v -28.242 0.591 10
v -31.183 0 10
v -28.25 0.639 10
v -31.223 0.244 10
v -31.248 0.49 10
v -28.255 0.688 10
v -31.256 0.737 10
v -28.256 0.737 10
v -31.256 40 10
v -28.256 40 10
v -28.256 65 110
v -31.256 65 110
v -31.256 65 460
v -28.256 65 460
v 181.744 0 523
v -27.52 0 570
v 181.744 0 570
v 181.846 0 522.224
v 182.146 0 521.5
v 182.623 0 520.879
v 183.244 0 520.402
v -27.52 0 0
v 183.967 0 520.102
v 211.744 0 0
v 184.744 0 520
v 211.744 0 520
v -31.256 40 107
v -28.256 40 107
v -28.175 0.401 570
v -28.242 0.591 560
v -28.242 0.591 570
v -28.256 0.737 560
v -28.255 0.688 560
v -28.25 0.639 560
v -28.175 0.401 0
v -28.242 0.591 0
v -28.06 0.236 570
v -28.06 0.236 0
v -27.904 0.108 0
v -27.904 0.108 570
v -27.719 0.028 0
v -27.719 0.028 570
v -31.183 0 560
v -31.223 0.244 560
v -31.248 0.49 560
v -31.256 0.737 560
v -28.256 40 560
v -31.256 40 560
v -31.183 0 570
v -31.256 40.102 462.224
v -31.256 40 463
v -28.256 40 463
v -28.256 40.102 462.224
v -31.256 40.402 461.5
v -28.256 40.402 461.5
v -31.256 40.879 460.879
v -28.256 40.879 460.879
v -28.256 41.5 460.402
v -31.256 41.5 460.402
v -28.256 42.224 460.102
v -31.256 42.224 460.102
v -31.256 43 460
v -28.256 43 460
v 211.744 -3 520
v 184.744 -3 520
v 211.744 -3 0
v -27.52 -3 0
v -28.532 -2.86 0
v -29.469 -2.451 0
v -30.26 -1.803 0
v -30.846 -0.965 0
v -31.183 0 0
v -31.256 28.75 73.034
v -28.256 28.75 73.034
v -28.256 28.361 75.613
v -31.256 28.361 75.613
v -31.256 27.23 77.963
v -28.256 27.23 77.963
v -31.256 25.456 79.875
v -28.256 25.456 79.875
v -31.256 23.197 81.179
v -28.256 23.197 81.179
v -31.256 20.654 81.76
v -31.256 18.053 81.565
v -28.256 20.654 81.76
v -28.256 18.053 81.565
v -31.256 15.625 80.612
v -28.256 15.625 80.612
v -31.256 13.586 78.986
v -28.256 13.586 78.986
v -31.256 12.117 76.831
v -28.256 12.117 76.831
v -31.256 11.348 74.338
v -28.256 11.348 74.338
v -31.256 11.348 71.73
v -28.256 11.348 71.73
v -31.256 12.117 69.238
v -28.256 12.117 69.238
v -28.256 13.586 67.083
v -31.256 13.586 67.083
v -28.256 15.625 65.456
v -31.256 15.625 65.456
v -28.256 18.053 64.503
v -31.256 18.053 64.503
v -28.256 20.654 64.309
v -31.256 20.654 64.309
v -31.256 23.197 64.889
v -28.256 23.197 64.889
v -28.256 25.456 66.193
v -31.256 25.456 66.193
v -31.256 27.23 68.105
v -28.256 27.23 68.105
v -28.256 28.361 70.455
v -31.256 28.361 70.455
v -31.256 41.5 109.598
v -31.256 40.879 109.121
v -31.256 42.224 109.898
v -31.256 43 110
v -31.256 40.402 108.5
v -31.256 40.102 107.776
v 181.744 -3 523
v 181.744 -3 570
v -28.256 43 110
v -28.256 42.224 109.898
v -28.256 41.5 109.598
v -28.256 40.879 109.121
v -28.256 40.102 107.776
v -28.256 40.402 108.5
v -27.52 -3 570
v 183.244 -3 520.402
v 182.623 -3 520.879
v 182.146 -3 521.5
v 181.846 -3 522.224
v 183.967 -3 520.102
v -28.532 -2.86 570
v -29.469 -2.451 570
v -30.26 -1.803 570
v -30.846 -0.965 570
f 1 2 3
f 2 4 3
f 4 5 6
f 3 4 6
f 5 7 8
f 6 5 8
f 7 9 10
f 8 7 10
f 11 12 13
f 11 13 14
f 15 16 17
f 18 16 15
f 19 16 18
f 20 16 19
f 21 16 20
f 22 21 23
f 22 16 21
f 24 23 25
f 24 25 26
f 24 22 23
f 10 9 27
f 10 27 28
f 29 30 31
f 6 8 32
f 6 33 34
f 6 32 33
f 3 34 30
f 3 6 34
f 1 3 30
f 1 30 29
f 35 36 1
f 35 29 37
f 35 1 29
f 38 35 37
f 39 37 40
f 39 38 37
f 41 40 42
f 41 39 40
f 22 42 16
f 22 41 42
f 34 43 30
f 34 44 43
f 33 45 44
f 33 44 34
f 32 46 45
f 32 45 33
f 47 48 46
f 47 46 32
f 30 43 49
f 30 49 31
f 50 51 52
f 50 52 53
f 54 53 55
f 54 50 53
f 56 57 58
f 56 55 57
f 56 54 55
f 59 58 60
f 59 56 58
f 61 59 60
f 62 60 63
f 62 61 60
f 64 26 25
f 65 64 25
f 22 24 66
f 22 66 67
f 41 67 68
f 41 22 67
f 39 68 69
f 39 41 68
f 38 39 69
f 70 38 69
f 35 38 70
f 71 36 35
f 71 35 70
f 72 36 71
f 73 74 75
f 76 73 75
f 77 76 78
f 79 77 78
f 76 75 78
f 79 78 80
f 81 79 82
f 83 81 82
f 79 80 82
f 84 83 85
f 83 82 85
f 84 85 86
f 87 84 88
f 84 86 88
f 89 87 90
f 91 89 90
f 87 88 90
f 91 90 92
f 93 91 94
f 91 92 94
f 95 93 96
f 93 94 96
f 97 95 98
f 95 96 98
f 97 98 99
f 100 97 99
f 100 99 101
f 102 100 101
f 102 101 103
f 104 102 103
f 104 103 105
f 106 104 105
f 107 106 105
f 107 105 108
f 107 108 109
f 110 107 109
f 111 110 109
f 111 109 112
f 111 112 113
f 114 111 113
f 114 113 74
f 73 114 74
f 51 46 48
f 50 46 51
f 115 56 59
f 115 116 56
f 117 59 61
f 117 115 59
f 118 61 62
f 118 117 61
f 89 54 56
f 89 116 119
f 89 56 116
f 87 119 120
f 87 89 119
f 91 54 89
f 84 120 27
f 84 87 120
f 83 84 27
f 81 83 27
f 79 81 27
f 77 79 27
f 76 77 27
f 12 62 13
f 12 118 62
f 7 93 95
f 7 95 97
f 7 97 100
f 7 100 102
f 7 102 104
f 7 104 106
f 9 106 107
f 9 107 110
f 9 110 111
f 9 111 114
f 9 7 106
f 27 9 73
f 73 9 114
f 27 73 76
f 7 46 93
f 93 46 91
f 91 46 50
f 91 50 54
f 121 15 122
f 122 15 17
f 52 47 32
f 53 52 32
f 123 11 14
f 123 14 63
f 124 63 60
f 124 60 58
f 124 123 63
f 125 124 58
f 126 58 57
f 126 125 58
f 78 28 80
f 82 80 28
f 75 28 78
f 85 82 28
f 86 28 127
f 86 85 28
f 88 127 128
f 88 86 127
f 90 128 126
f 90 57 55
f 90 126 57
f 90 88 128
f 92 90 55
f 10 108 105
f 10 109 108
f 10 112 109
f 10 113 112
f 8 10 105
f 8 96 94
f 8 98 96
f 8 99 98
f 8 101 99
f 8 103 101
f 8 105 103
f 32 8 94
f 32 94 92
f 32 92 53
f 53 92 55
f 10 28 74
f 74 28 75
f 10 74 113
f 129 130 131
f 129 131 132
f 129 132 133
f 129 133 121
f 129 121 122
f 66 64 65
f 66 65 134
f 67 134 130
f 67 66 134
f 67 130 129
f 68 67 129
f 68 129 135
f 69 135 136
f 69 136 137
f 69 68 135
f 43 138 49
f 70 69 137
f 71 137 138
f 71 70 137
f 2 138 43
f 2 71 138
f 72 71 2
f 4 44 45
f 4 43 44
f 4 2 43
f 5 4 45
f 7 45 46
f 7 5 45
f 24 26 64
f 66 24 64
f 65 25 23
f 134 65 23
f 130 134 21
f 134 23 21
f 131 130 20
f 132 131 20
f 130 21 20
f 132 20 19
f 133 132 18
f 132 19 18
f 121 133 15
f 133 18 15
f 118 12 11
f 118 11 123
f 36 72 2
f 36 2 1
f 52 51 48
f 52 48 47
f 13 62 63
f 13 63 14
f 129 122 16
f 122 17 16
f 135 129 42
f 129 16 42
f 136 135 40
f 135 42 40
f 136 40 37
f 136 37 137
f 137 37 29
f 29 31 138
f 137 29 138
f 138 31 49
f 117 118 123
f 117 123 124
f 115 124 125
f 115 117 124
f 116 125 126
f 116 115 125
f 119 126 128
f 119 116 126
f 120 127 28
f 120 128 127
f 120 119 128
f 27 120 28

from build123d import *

# Parameters (mm, degrees)
BASE_FLANGE1_DEPTH       = 570
CUT_EXTRUDE1_OUTLINE_W   = 3
CUT_EXTRUDE1_OUTLINE_H   = 25
CUT_EXTRUDE1_DEPTH       = 107
CUT_EXTRUDE1_START       = 463
CUT_EXTRUDE1_2_OUTLINE_W = 3
CUT_EXTRUDE1_2_OUTLINE_H = 25
CUT_EXTRUDE1_2_DEPTH     = 107
CUT_EXTRUDE1_START_2     = -32
CUT_EXTRUDE1_3_DEPTH     = 5
CUT_EXTRUDE1_START_3     = -1
CUT_EXTRUDE1_4_DEPTH     = 11
CUT_EXTRUDE1_START_4     = 560
CUT_EXTRUDE1_5_DEPTH     = 11
CUT_EXTRUDE3_REACH       = 613.523
CUT_EXTRUDE4_REACH       = 623.872
SKETCH8_R                = 8.75


with BuildPart() as part:
    # Base-Flange1: sheet metal written as solids
    # Sketch1 → Base-Flange1 (new body)
    with BuildSketch(Plane.XY):
        with BuildLine():
            Line((-28.256118786, 65), (-28.256118786, 0.7366))
            ThreePointArc((-28.256118786, 0.7366), (-28.040373641, 0.215745145), (-27.519518786, 0))
            Line((-27.519518786, 0), (211.743881214, 0))
            Line((211.743881214, 0), (211.743881214, -3))
            Line((211.743881214, -3), (-27.519518786, -3))
            ThreePointArc((-27.519518786, -3), (-30.161693985, -1.905575199), (-31.256118786, 0.7366))
            Line((-31.256118786, 0.7366), (-31.256118786, 65))
            Line((-31.256118786, 65), (-28.256118786, 65))
        make_face()
    extrude(amount=BASE_FLANGE1_DEPTH)

    # Cut-Extrude1: read off the stored shape, not the designer's step
    # Cut-Extrude1 outline → Cut-Extrude1 (cut)
    with BuildSketch(Plane.XY):
        with Locations((-29.756118786, 52.5)):
            Rectangle(CUT_EXTRUDE1_OUTLINE_W, CUT_EXTRUDE1_OUTLINE_H)
    extrude(amount=CUT_EXTRUDE1_DEPTH, mode=Mode.SUBTRACT)

    # Cut-Extrude1 2 outline → Cut-Extrude1 2 (cut)
    with BuildSketch(Plane.XY.offset(CUT_EXTRUDE1_START)):
        with Locations((-29.756118786, 52.5)):
            Rectangle(CUT_EXTRUDE1_2_OUTLINE_W, CUT_EXTRUDE1_2_OUTLINE_H)
    extrude(amount=CUT_EXTRUDE1_2_DEPTH, mode=Mode.SUBTRACT)

    # Cut-Extrude1 3 outline → Cut-Extrude1 3 (cut)
    with BuildSketch(Plane.YZ.offset(CUT_EXTRUDE1_START_2)):
        with BuildLine():
            Line((65, 110), (43, 110))
            ThreePointArc((43, 110), (40.878679656, 109.121320344), (40, 107))
            Line((40, 107), (65, 107))
            Line((65, 107), (65, 110))
        make_face()
        with BuildLine():
            Line((43, 460), (65, 460))
            Line((65, 460), (65, 463))
            Line((65, 463), (40, 463))
            ThreePointArc((40, 463), (40.878679656, 460.878679656), (43, 460))
        make_face()
    extrude(amount=CUT_EXTRUDE1_3_DEPTH, mode=Mode.SUBTRACT)

    # Cut-Extrude1 4 outline → Cut-Extrude1 4 (cut)
    with BuildSketch(Plane.XY.offset(CUT_EXTRUDE1_START_3)):
        with BuildLine():
            Line((-31.182796008, 0), (-28.241664587, 0.591393245))
            ThreePointArc((-28.241664587, 0.591393245), (-28.252496329, 0.663637809), (-28.256118786, 0.7366))
            Line((-28.256118786, 0.7366), (-28.256118786, 40))
            Line((-28.256118786, 40), (-31.256118786, 40))
            Line((-31.256118786, 40), (-31.256118786, 0.7366))
            ThreePointArc((-31.256118786, 0.7366), (-31.237742907, 0.36647982), (-31.182796008, 0))
        make_face()
    extrude(amount=CUT_EXTRUDE1_4_DEPTH, mode=Mode.SUBTRACT)

    # Cut-Extrude1 5 outline → Cut-Extrude1 5 (cut)
    with BuildSketch(Plane.XY.offset(CUT_EXTRUDE1_START_4)):
        with BuildLine():
            Line((-31.182796008, 0), (-28.241664587, 0.591393245))
            ThreePointArc((-28.241664587, 0.591393245), (-28.252496329, 0.663637809), (-28.256118786, 0.7366))
            Line((-28.256118786, 0.7366), (-28.256118786, 40))
            Line((-28.256118786, 40), (-31.256118786, 40))
            Line((-31.256118786, 40), (-31.256118786, 0.7366))
            ThreePointArc((-31.256118786, 0.7366), (-31.237742907, 0.36647982), (-31.182796008, 0))
        make_face()
    extrude(amount=CUT_EXTRUDE1_5_DEPTH, mode=Mode.SUBTRACT)

    # Sketch7 → Cut-Extrude3 (cut, up to next)
    with BuildSketch(Plane(origin=(0, 0, 0), x_dir=(1, 0, 0), z_dir=(0, 1, 0)), mode=Mode.PRIVATE) as cut_extrude3_sk1:
        with BuildLine():
            Line((211.743881214, -520), (184.743881214, -520))
            ThreePointArc((184.743881214, -520), (182.62256087, -520.878679656), (181.743881214, -523))
            Line((181.743881214, -523), (181.743881214, -570))
            Line((181.743881214, -570), (211.743881214, -570))
            Line((211.743881214, -570), (211.743881214, -520))
        make_face()
    cut_extrude3_tool1 = extrude(cut_extrude3_sk1.sketch, amount=-CUT_EXTRUDE3_REACH, mode=Mode.PRIVATE) & part.part
    add(cut_extrude3_tool1.solids().sort_by_distance((196.762356, 0, 545.031368))[0], mode=Mode.SUBTRACT)

    # Sketch8 → Cut-Extrude4 (cut, up to next)
    with BuildSketch(Plane(origin=(-28.256118786, 0, 0), x_dir=(0, 0, -1), z_dir=(1, 0, 0)), mode=Mode.PRIVATE) as cut_extrude4_sk1:
        with Locations(Location((-73.034040989, 20, 0), (0, 0, 90))):
            Circle(SKETCH8_R)
    cut_extrude4_tool1 = extrude(cut_extrude4_sk1.sketch, amount=-CUT_EXTRUDE4_REACH, mode=Mode.PRIVATE) & part.part
    add(cut_extrude4_tool1.solids().sort_by_distance((-28.256119, 20, 73.034041))[0], mode=Mode.SUBTRACT)


solid = part.part
